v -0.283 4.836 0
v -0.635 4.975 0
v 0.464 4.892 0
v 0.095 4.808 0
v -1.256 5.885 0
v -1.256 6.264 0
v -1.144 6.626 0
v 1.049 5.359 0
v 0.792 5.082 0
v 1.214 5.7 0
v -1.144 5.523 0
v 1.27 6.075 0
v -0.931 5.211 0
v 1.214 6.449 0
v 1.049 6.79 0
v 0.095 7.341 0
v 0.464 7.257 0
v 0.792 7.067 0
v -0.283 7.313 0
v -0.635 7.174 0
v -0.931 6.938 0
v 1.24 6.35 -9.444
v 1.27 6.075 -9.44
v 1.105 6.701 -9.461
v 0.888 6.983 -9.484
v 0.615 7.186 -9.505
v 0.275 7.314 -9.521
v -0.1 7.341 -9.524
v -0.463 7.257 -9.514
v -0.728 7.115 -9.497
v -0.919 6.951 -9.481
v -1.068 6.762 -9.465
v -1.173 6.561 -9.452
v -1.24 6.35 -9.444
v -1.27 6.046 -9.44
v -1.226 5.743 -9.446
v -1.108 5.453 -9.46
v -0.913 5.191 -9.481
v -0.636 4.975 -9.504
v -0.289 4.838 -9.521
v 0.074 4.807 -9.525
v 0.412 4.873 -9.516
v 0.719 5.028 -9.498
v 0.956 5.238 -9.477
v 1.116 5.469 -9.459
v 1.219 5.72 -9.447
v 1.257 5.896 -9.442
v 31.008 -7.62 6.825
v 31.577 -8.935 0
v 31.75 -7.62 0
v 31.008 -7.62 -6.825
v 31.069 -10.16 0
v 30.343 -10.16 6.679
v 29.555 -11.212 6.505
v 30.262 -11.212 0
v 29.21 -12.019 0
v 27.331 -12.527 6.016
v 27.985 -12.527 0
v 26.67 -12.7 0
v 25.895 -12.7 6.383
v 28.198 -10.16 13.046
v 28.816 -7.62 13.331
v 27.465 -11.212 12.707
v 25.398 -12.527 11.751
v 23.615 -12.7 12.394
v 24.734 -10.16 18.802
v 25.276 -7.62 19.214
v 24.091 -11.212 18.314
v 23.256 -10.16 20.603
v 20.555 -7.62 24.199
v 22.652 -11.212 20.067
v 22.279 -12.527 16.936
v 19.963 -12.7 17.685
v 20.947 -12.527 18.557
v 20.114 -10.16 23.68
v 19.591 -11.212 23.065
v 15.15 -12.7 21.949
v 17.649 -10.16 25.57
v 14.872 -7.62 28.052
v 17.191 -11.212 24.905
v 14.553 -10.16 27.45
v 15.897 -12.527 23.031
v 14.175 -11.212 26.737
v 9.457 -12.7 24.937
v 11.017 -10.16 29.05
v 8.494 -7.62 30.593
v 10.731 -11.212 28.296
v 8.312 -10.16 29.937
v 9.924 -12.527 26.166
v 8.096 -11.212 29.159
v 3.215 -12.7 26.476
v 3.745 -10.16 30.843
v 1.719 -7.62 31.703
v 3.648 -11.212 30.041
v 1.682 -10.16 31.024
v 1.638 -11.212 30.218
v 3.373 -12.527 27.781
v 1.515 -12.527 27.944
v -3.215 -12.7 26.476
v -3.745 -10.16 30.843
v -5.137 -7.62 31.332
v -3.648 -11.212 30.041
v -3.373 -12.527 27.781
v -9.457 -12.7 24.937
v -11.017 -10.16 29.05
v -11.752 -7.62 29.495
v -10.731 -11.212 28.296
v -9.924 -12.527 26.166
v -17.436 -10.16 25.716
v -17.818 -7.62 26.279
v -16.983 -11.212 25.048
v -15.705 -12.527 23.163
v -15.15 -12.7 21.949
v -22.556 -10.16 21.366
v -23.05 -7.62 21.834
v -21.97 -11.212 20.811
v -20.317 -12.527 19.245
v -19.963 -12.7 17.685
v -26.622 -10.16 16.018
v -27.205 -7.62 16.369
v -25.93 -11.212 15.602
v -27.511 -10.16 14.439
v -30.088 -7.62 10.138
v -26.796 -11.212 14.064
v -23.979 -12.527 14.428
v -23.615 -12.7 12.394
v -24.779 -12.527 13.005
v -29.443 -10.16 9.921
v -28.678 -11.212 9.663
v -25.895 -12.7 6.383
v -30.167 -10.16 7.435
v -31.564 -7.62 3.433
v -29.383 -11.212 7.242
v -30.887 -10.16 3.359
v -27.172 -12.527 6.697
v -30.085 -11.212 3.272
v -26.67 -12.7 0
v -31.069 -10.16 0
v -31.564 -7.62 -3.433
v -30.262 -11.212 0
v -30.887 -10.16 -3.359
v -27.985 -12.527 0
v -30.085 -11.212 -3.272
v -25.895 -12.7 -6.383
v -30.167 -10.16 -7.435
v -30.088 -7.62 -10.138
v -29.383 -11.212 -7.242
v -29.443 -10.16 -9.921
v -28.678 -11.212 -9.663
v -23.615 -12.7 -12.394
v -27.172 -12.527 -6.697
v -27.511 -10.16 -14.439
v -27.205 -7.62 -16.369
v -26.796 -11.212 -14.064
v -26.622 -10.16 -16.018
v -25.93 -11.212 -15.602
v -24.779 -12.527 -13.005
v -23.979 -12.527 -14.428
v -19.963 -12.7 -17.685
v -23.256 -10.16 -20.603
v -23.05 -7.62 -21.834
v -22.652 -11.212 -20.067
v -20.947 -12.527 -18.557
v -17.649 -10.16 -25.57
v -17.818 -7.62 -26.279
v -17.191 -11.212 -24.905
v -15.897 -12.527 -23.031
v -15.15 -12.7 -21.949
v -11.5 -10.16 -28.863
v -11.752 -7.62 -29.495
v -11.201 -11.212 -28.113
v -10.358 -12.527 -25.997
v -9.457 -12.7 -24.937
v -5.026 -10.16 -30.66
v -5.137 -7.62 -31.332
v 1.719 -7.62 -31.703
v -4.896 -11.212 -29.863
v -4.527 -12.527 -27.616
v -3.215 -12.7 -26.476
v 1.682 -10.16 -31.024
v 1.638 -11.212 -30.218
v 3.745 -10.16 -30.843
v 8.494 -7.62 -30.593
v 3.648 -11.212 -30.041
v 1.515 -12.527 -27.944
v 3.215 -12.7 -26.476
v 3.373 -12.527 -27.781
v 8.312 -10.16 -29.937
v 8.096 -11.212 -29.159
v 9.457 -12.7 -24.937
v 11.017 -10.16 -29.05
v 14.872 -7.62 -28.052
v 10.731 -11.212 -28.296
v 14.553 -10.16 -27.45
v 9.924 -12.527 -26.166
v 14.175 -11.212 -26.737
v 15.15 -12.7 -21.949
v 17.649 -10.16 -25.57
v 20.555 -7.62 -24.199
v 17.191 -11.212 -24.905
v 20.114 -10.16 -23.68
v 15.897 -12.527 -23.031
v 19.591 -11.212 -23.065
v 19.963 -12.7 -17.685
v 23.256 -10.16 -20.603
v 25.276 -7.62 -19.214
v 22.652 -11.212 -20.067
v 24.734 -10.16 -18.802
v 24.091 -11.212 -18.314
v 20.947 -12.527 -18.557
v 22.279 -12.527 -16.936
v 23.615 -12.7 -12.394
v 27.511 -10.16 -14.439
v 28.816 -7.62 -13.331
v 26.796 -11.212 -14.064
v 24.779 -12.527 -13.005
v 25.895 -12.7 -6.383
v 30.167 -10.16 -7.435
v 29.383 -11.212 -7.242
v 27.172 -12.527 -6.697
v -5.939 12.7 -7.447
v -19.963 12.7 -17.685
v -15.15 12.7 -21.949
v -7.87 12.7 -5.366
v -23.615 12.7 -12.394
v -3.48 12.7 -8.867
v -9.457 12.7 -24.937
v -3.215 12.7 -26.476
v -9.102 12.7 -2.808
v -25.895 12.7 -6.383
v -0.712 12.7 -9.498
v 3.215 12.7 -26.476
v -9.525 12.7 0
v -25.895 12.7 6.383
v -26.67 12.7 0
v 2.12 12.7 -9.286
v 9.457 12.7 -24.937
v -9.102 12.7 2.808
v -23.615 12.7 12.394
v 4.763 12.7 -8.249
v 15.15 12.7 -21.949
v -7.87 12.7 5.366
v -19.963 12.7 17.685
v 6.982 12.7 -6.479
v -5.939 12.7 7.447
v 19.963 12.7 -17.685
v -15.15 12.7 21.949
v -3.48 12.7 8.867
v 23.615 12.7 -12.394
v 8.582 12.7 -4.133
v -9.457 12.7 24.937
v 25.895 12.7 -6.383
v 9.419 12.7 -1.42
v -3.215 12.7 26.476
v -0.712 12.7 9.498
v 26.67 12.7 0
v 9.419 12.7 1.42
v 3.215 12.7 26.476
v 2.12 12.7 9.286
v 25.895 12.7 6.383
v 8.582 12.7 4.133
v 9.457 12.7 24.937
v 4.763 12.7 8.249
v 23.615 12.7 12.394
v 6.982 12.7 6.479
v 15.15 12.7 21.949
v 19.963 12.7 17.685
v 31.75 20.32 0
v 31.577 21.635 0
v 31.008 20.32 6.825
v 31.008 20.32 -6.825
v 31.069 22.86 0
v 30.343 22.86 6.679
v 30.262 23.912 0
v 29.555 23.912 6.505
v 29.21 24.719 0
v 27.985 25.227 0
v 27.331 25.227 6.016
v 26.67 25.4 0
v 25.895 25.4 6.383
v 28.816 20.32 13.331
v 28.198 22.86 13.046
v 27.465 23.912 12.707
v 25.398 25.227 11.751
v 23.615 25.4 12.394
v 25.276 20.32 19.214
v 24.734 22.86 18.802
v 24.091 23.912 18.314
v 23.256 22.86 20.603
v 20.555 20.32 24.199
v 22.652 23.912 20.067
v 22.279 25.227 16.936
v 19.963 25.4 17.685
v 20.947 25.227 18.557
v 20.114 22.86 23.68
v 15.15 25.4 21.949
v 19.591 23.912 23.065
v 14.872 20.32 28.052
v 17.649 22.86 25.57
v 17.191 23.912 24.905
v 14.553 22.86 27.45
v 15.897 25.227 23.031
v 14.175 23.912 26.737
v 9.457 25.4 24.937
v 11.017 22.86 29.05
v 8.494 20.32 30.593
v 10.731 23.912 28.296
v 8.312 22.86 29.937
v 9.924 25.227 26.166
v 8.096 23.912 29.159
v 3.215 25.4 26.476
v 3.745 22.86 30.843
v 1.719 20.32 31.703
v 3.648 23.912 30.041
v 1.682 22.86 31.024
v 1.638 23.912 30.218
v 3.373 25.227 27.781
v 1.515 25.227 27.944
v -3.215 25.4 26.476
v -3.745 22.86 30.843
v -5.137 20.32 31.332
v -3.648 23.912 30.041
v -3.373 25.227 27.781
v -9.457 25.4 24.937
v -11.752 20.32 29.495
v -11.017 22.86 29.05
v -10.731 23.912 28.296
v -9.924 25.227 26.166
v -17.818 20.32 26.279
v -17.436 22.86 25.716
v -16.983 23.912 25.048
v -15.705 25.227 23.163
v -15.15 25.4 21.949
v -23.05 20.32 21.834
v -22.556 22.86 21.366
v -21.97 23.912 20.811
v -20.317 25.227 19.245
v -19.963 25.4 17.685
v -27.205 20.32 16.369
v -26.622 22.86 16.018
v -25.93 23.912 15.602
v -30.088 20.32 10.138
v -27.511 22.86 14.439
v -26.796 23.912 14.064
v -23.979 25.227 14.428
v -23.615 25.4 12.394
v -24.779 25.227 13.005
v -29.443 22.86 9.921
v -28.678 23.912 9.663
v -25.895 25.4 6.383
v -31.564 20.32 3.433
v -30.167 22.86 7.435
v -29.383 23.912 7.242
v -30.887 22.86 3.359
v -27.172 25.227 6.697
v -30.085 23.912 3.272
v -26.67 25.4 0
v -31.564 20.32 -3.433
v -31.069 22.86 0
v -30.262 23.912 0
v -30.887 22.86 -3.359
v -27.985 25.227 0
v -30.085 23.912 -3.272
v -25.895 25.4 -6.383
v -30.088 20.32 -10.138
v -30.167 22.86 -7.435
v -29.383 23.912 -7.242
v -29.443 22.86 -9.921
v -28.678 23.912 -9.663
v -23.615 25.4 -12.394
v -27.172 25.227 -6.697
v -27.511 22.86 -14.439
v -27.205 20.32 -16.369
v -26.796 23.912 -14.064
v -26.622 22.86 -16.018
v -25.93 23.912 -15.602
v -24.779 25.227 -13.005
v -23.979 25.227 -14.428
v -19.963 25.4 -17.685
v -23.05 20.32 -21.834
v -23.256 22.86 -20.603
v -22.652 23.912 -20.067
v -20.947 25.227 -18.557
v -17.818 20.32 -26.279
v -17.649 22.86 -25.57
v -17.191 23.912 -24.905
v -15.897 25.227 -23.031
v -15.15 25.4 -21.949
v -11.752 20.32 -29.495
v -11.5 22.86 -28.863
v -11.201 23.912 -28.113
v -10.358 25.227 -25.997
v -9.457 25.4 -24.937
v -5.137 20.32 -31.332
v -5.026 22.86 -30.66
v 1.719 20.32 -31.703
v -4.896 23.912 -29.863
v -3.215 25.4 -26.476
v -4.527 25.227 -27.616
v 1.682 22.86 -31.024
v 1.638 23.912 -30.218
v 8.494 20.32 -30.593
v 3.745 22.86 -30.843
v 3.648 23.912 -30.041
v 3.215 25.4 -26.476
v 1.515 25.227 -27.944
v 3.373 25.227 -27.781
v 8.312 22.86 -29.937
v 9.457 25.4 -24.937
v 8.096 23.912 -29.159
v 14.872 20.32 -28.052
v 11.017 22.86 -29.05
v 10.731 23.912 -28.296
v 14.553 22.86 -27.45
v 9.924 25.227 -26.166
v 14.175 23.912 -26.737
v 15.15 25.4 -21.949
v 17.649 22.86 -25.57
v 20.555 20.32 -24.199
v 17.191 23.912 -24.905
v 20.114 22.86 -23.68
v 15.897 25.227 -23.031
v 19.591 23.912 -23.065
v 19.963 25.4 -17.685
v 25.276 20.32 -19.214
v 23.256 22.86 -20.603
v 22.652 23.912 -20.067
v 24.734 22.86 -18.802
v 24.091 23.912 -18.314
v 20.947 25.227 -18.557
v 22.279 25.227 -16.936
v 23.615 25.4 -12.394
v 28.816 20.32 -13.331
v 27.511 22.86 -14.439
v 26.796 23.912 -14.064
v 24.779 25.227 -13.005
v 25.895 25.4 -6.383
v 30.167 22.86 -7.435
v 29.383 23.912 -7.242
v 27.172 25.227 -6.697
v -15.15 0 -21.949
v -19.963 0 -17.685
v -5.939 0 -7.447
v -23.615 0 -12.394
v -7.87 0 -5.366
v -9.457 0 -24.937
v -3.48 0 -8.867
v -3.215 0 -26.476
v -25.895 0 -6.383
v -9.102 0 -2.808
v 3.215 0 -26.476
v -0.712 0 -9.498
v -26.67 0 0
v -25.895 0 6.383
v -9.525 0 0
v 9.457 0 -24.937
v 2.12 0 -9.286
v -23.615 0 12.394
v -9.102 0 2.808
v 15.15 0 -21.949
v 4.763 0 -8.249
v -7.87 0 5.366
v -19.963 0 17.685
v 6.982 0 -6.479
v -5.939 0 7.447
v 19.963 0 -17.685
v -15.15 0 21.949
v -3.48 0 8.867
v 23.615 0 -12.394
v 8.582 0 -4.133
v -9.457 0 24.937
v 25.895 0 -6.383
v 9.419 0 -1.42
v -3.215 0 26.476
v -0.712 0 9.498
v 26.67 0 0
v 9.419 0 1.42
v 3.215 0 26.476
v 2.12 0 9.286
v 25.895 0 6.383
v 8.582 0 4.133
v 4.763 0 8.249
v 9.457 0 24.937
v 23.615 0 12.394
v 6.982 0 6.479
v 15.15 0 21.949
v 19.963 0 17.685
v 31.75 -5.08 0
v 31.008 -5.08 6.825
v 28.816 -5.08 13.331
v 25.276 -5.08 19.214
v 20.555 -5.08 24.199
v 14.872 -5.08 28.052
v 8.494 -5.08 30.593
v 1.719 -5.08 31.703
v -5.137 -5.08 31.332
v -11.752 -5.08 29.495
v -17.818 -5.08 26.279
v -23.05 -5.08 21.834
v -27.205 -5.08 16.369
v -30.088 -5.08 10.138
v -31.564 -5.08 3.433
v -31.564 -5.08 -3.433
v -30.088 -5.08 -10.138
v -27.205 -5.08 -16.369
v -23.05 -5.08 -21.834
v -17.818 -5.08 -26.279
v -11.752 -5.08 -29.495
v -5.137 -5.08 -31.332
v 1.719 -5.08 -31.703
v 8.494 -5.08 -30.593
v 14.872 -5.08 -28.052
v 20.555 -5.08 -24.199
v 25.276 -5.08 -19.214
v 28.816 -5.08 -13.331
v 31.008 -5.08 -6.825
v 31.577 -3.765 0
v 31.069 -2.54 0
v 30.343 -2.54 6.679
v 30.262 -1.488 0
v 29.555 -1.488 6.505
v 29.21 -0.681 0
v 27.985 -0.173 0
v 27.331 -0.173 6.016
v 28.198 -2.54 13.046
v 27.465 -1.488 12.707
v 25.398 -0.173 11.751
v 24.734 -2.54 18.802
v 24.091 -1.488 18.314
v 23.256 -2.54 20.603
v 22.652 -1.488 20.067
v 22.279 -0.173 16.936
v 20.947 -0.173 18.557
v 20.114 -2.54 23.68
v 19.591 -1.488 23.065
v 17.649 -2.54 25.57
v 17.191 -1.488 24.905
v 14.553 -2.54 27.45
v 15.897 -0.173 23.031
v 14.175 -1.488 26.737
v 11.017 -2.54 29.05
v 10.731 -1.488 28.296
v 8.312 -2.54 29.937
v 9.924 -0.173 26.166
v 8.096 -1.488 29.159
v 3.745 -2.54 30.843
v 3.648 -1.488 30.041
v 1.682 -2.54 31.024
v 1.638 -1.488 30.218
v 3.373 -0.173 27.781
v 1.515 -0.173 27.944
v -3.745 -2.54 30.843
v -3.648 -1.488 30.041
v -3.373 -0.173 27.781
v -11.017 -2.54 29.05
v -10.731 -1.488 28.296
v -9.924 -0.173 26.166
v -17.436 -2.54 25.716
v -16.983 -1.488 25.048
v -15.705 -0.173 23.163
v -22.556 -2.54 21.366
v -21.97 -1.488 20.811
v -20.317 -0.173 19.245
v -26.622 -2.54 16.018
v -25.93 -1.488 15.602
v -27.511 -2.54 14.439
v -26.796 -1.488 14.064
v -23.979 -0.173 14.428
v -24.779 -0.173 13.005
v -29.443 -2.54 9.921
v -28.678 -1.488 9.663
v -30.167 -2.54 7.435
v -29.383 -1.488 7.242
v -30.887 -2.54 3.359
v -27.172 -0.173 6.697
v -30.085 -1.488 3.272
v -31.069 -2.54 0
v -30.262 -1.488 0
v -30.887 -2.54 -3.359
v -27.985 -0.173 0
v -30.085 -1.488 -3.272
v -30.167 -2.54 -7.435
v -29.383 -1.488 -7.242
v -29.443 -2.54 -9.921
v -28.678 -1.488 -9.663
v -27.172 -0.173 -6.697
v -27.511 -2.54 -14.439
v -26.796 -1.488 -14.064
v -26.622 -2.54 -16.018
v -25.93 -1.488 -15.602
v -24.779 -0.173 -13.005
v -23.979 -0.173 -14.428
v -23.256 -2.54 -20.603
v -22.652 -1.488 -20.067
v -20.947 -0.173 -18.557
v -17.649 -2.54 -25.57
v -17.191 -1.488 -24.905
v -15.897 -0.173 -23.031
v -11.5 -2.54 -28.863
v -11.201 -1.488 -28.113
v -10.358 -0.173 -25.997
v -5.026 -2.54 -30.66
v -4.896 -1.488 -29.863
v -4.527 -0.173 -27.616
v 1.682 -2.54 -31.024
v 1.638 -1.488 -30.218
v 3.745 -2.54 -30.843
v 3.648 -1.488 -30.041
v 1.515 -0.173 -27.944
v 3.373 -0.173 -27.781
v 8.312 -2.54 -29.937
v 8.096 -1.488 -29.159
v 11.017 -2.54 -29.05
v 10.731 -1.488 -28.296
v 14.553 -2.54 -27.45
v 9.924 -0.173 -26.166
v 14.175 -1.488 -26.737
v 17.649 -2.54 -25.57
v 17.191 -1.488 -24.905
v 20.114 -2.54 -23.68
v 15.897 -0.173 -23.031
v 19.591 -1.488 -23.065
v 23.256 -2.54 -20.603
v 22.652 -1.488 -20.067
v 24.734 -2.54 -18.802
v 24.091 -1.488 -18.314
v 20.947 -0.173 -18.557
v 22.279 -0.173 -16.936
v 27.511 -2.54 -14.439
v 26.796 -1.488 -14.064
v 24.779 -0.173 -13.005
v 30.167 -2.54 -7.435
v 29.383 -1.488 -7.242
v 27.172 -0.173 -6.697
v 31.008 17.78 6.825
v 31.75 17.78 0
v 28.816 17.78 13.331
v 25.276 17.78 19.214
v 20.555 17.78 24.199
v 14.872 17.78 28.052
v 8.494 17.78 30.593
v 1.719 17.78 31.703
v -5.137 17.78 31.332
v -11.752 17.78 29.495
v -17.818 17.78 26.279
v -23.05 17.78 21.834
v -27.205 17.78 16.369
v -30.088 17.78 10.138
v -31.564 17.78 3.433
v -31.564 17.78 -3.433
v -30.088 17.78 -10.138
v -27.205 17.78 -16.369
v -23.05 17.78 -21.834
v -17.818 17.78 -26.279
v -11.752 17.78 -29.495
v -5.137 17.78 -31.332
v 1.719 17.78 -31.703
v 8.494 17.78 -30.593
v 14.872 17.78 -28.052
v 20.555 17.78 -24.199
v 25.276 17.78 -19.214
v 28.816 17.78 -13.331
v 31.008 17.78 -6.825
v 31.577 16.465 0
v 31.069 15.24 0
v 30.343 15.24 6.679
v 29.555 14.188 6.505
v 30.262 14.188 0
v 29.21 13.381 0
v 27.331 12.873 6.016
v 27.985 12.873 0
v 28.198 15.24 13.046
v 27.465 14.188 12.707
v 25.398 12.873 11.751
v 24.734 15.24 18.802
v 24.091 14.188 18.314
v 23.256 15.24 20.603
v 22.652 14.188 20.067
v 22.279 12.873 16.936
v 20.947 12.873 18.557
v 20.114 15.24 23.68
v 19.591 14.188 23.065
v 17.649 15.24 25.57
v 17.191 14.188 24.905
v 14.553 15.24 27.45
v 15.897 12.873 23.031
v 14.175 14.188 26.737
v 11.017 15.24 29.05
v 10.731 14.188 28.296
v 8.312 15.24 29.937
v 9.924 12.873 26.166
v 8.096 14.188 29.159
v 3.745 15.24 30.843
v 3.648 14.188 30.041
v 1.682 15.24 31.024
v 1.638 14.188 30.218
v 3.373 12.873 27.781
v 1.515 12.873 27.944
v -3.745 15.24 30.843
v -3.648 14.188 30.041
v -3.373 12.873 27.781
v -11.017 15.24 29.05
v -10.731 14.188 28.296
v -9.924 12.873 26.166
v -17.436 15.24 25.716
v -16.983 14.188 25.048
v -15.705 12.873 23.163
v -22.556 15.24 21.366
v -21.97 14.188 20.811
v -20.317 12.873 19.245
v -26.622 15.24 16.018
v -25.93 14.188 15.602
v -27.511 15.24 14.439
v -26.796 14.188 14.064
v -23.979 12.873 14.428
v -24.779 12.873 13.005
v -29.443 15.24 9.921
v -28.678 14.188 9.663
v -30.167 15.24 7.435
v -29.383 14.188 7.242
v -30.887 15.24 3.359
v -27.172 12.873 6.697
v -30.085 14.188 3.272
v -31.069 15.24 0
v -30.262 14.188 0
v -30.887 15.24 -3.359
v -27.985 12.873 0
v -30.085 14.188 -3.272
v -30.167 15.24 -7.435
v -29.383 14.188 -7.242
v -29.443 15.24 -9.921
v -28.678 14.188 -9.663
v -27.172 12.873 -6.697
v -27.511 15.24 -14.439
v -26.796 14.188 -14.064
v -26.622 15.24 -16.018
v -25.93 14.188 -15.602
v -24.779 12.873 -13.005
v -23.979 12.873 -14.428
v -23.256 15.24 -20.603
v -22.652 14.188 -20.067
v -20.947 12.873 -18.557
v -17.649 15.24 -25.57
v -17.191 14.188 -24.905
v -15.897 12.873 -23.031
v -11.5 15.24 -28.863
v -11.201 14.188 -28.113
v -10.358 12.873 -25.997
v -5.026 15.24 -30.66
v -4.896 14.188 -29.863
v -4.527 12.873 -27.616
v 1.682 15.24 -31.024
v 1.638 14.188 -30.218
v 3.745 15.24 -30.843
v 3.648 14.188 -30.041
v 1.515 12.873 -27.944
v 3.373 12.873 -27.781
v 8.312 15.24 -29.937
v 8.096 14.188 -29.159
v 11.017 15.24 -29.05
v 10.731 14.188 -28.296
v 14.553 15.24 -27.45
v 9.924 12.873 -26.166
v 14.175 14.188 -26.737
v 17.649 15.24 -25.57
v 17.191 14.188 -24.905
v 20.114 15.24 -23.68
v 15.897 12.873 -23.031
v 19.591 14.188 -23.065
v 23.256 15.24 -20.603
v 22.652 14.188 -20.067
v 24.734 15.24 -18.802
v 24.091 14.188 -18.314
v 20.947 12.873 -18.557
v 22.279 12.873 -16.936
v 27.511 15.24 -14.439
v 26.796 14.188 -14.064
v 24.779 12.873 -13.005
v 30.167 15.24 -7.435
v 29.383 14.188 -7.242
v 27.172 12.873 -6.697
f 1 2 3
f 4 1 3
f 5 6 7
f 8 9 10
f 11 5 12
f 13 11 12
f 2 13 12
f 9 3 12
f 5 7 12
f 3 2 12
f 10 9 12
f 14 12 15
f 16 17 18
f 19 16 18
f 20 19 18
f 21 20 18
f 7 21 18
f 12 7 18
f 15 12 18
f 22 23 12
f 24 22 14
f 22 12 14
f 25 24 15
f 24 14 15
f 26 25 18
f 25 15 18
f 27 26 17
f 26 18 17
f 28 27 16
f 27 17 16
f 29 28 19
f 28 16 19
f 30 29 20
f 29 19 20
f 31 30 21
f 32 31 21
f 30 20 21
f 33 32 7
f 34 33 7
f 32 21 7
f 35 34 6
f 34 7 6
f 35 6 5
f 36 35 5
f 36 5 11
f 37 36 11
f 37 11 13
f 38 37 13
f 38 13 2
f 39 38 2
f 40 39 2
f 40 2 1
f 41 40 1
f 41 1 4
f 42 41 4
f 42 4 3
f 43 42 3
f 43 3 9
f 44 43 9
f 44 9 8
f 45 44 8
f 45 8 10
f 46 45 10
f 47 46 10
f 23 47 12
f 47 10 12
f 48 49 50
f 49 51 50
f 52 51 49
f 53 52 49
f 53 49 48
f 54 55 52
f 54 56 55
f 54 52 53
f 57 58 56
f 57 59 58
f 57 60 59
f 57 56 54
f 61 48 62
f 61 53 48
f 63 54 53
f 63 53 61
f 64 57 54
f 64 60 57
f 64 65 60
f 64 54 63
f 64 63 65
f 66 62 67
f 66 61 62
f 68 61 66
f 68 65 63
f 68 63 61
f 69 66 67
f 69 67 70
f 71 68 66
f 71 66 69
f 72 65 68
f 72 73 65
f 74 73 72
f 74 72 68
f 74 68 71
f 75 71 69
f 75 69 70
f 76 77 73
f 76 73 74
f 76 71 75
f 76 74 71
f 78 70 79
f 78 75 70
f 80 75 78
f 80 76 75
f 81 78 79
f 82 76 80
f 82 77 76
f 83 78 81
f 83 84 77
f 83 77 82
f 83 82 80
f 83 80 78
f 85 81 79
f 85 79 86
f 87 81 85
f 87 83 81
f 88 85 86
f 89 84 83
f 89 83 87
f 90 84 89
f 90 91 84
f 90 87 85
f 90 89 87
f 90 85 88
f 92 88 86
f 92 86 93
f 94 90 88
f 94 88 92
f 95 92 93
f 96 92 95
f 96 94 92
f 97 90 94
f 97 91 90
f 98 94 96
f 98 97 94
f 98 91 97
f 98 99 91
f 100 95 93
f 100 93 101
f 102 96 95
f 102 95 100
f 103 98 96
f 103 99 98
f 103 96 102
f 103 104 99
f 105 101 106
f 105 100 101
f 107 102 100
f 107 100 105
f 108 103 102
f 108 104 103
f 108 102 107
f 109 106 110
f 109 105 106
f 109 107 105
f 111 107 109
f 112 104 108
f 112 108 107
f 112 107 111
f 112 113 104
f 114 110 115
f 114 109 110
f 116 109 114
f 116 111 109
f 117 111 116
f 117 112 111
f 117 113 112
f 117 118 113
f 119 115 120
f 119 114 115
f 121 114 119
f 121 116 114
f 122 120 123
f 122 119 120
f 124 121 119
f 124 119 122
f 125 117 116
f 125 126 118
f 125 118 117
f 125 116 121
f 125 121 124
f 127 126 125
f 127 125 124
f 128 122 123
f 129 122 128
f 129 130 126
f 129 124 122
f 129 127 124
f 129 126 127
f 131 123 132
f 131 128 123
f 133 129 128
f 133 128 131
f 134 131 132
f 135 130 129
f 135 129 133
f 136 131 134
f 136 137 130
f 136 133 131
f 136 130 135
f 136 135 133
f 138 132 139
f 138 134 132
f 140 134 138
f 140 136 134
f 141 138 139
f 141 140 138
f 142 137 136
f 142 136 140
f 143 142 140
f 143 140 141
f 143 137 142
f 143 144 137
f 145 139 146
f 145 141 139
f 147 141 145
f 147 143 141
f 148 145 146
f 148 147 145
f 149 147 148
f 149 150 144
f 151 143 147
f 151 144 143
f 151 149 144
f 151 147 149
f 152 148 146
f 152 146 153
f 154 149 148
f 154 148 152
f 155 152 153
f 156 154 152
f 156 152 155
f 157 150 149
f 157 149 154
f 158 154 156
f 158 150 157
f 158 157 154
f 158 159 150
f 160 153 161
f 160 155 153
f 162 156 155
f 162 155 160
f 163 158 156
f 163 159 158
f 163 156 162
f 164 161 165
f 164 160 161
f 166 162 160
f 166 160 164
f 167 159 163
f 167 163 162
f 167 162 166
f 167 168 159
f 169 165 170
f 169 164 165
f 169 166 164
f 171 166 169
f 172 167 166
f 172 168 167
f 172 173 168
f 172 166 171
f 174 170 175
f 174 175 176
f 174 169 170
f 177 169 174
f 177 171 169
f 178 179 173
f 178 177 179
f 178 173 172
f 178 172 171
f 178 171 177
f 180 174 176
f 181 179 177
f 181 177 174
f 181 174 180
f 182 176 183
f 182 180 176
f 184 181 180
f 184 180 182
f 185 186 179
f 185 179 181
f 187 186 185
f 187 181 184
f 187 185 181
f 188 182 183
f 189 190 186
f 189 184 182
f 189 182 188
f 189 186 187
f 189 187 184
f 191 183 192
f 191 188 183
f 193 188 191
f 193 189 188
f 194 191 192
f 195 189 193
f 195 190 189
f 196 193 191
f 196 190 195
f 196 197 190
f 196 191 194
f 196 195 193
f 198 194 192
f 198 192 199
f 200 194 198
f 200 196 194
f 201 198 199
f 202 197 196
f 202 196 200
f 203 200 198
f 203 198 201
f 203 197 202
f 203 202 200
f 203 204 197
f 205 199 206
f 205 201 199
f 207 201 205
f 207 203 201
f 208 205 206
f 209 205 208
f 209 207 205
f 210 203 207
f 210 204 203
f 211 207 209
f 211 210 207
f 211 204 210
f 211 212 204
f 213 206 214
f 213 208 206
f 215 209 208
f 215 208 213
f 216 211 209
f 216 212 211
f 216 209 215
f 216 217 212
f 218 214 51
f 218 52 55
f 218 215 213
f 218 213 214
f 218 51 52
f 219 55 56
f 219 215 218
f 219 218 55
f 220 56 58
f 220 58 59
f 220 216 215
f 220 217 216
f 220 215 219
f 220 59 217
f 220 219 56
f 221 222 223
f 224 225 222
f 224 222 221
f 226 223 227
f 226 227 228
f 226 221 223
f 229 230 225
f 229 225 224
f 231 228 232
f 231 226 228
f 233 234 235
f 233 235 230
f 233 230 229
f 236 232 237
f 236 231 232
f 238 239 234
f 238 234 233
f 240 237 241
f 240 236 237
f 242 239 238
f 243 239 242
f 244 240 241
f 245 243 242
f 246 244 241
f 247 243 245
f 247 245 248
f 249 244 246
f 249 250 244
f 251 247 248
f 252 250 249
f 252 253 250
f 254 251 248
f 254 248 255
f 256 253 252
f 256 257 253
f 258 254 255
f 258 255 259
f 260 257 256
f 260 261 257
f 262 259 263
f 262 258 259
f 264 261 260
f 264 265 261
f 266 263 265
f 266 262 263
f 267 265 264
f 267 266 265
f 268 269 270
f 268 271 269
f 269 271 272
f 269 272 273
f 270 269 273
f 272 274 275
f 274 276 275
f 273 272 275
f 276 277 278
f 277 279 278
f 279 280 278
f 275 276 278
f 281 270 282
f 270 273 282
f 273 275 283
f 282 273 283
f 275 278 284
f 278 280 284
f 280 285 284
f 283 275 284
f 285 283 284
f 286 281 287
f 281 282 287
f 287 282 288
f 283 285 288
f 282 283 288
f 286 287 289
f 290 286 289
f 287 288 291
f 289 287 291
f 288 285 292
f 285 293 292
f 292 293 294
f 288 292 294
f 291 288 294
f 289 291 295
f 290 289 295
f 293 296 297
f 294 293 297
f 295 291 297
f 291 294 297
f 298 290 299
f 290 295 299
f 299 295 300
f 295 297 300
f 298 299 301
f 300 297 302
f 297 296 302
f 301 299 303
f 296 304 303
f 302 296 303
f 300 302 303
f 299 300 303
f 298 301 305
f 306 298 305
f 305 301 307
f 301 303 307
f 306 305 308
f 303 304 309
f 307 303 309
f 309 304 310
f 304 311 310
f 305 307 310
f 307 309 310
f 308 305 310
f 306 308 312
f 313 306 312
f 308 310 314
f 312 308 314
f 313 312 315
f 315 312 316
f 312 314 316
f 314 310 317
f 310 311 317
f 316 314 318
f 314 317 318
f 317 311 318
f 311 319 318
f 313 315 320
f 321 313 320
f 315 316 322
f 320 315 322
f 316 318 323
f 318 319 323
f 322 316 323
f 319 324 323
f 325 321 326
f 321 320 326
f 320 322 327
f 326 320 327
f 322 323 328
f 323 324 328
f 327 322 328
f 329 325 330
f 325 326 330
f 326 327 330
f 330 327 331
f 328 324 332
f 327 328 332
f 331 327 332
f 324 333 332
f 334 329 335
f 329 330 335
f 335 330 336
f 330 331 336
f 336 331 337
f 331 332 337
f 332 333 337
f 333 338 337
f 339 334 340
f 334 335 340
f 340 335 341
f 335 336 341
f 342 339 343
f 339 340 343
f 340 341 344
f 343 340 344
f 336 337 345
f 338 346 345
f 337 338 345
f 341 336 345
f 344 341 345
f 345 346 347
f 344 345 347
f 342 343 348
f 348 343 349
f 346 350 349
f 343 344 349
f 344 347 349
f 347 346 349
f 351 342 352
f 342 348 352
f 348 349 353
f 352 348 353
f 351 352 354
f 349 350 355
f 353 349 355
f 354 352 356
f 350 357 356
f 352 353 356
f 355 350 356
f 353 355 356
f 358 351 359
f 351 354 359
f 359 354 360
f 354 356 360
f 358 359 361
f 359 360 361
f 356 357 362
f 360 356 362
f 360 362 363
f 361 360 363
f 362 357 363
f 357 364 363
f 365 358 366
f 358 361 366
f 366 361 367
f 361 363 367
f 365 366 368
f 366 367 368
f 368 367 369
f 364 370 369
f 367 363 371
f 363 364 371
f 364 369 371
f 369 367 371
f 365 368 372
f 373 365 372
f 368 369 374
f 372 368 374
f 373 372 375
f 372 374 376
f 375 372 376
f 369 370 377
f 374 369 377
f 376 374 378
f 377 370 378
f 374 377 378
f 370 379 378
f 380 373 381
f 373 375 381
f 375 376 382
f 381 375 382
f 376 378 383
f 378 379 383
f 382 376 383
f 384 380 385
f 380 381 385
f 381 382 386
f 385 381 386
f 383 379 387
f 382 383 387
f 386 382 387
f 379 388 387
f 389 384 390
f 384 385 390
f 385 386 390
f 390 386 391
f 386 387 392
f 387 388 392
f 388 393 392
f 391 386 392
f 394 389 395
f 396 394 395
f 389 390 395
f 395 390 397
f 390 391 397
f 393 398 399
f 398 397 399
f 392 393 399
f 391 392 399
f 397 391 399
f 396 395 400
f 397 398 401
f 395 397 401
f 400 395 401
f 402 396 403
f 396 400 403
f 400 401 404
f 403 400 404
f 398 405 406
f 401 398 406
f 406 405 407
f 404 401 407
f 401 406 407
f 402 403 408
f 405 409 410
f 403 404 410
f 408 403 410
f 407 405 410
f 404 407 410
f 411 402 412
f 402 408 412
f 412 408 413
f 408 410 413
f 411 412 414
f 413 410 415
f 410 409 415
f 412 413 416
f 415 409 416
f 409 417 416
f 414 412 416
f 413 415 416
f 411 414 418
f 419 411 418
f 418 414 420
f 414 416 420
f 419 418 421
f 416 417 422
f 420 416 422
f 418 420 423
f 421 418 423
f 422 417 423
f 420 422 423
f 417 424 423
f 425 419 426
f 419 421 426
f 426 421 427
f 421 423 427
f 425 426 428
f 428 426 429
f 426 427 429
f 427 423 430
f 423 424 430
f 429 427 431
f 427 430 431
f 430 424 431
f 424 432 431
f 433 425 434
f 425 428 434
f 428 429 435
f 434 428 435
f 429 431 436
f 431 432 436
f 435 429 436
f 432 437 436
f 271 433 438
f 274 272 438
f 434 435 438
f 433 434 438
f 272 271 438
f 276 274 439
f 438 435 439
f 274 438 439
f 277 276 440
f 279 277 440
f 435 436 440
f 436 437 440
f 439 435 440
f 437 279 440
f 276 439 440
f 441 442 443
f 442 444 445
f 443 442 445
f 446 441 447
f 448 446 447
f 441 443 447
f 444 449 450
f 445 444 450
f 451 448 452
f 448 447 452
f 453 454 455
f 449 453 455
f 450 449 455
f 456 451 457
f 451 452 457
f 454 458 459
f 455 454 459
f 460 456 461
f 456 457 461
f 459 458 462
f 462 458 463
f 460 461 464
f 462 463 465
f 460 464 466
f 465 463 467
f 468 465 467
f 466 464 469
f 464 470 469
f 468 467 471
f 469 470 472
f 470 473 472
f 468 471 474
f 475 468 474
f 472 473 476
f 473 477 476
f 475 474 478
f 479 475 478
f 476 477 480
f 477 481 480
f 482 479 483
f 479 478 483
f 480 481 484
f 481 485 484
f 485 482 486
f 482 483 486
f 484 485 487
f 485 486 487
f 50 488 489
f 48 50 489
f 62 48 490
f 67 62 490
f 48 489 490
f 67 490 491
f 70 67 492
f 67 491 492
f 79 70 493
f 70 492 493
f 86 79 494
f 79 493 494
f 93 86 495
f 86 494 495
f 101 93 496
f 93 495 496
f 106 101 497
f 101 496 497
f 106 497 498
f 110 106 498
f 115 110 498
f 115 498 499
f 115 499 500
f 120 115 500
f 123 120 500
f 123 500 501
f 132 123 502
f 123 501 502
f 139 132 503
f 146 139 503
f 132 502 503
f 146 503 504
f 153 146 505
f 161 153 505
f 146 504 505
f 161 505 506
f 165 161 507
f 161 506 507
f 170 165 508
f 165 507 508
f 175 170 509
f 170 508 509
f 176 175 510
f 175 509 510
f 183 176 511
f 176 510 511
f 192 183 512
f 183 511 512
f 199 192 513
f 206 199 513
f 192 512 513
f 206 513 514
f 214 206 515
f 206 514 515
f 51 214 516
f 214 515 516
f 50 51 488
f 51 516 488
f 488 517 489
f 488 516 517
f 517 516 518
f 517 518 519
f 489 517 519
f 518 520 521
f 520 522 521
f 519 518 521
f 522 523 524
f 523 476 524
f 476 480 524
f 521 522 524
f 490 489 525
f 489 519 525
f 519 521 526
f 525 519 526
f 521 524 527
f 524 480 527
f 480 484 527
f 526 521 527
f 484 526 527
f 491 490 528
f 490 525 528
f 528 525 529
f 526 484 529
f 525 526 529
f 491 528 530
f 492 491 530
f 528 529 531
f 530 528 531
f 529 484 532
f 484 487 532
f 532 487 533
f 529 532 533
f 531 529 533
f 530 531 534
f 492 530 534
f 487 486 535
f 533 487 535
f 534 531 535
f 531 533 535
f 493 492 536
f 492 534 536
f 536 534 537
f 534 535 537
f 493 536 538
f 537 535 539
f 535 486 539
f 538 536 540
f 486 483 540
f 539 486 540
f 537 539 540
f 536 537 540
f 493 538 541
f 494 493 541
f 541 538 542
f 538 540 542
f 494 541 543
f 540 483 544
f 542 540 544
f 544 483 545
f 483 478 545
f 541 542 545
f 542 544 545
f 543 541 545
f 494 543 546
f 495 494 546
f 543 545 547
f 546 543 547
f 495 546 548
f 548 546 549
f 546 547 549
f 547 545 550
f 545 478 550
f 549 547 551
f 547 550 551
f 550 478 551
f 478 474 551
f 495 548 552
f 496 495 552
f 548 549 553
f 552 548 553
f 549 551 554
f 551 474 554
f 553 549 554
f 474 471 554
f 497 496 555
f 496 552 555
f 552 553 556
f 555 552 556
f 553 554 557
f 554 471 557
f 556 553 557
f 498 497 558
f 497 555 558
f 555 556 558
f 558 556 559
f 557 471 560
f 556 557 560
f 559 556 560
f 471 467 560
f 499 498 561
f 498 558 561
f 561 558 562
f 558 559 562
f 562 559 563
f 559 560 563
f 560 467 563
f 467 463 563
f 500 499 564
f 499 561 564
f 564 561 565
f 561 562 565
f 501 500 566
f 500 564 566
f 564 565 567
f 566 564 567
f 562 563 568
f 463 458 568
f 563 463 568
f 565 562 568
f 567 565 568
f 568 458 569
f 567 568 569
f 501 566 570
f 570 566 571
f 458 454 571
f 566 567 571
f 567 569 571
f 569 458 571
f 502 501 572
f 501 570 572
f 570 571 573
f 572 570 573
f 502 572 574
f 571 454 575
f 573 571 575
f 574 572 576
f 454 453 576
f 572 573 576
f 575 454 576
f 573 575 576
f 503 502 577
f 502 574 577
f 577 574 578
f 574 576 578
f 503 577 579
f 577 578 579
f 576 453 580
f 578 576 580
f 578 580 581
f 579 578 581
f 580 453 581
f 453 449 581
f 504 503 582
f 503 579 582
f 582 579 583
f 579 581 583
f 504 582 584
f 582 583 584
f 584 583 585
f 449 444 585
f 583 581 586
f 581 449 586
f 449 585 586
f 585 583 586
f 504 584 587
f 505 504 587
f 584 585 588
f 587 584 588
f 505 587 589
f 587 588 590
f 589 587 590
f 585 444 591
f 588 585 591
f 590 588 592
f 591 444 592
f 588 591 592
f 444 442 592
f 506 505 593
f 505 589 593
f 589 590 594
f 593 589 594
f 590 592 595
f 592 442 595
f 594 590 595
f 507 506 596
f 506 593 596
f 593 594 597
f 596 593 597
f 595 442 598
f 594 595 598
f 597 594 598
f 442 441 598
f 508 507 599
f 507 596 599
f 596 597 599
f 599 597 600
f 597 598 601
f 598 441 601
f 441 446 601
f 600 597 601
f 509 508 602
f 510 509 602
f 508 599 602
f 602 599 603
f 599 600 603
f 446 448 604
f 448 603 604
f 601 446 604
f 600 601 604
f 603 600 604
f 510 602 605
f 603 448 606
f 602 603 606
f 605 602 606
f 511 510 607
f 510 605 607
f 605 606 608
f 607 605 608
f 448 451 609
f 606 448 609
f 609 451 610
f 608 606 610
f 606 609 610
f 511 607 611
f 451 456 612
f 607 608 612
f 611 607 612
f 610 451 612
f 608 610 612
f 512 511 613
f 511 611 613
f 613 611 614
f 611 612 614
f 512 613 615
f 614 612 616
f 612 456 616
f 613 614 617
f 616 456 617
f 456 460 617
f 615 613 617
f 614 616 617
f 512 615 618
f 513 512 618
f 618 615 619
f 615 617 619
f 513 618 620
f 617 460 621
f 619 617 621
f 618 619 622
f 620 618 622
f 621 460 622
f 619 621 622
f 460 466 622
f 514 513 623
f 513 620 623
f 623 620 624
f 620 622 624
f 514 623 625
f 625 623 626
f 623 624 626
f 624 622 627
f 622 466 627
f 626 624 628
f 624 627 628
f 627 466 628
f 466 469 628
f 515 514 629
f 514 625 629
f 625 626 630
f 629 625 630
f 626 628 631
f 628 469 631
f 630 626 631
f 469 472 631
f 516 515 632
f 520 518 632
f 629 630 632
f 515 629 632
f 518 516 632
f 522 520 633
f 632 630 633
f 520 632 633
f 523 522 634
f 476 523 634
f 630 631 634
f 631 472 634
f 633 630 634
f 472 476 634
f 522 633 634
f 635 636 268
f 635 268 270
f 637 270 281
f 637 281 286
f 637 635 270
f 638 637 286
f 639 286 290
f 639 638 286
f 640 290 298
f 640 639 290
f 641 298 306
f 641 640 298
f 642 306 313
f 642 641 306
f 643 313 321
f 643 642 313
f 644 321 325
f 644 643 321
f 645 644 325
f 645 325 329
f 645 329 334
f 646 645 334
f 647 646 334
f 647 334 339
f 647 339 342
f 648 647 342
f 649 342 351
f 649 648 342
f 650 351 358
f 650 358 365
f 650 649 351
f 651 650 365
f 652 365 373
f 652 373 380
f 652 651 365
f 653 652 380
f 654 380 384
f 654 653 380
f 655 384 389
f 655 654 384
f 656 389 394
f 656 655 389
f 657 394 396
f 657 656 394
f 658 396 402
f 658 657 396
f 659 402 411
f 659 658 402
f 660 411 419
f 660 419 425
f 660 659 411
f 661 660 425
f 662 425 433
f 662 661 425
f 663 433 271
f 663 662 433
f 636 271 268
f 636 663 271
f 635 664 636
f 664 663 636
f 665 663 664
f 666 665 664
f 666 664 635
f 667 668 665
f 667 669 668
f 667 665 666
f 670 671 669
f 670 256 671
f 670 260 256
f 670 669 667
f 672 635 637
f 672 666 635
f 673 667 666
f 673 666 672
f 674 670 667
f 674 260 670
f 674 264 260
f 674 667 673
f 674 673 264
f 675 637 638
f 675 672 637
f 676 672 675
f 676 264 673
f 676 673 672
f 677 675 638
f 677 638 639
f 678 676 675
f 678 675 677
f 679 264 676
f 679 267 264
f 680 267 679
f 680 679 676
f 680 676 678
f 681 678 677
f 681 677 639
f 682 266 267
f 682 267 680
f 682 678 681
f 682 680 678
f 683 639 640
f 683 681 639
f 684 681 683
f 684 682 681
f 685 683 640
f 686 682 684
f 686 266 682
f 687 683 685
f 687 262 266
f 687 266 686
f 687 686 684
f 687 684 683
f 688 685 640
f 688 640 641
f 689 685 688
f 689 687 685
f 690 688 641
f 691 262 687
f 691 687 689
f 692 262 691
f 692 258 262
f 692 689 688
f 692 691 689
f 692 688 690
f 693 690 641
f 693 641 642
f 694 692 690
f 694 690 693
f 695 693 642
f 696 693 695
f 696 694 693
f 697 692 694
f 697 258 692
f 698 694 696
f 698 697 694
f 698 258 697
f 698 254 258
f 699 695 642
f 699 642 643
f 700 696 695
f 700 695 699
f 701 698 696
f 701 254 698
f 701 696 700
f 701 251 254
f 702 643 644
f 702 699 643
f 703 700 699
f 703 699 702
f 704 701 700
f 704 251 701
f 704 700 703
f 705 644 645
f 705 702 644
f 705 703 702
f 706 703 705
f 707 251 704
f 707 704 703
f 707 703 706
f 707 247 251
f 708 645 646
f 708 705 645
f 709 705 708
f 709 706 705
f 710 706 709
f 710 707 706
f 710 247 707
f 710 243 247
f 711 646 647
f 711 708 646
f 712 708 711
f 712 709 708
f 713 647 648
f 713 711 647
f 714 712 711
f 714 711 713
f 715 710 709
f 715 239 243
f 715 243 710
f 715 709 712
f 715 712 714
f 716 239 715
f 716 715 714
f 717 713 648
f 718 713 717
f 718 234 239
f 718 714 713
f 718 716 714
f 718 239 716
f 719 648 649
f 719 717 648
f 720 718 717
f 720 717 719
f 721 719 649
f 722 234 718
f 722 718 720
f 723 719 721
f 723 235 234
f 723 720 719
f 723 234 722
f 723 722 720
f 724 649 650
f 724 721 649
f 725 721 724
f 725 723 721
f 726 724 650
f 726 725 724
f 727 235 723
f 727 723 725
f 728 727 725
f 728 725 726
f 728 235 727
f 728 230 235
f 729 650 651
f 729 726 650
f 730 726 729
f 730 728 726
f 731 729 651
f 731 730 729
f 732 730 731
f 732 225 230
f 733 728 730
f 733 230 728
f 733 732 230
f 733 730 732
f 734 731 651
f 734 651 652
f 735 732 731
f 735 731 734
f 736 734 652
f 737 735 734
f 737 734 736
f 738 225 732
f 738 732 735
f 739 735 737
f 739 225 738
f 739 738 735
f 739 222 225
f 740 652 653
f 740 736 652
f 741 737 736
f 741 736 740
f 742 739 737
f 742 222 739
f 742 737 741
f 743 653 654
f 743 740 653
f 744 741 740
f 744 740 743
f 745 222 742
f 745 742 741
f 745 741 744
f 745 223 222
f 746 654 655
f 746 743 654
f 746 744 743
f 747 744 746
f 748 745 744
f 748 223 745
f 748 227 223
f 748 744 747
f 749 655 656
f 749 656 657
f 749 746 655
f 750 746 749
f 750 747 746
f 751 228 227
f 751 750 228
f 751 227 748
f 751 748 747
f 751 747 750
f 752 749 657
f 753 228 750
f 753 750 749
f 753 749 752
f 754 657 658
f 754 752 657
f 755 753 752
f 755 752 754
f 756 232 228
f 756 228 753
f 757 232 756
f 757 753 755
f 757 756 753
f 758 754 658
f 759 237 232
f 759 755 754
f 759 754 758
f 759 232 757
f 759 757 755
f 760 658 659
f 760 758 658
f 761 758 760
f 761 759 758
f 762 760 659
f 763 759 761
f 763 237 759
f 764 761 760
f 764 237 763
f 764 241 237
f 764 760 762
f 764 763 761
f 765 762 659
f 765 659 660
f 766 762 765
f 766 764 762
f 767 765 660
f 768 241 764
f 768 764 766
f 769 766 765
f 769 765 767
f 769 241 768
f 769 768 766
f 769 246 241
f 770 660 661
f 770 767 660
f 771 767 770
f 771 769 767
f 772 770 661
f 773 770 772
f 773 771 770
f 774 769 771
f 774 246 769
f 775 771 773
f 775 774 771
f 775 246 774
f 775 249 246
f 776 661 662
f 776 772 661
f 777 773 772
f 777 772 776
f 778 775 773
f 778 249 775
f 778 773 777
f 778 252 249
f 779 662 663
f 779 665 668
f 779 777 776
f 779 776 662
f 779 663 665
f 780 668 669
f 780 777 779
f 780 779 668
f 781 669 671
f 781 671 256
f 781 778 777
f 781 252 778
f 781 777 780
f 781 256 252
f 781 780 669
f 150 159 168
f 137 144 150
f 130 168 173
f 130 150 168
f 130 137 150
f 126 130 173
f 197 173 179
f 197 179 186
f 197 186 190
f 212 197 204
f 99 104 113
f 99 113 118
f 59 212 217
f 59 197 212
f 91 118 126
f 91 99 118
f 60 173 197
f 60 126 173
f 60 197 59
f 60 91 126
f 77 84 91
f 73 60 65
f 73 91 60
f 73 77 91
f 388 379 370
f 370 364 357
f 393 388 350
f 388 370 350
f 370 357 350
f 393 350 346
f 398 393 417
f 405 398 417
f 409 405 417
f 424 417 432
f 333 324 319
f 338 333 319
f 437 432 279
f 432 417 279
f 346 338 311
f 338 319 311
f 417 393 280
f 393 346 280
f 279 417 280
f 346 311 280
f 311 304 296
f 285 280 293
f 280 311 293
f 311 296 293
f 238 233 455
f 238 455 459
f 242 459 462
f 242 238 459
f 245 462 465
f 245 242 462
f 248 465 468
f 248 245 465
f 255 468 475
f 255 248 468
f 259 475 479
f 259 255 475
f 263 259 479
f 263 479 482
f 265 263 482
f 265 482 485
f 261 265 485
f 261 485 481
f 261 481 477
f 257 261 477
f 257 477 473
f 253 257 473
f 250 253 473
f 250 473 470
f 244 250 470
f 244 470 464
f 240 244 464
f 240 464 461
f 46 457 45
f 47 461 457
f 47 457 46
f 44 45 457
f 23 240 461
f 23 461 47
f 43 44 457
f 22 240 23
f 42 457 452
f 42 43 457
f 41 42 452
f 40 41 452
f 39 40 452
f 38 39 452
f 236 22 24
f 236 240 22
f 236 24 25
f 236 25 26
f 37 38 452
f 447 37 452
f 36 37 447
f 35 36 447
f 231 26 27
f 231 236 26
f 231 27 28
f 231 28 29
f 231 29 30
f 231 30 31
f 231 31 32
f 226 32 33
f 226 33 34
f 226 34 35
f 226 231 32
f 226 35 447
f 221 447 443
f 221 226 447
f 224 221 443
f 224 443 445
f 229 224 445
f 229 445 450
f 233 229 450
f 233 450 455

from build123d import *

# Parameters (mm, degrees)
F0_R     = 31.75
F1_DEPTH = 12.7
F2_R     = 5.08
F3_R     = 9.525
F4_DEPTH = 6.35
F7_D     = 2.54
F7_DEPTH = 25.4
F7_TIP   = 0.7630929862


with BuildPart() as f1:
    # F0 (on Front) → F1 (new body)
    with BuildSketch(Plane.XZ):
        Circle(F0_R)
    extrude(amount=F1_DEPTH)

    # F2
    f2_edges = [f1.edges().sort_by_distance(p)[0] for p in [
        (-31.75, -12.7, 0),
        (-31.75, 0, 0),
    ]]
    fillet(f2_edges, radius=F2_R)

    # F3 (on face) → F4 (join)
    with BuildSketch(Plane(origin=(0, 0, 0), x_dir=(-1, 0, 0), z_dir=(0, 1, 0))):
        Circle(F3_R)
    extrude(amount=F4_DEPTH)

    # F5: F1 across face


with BuildPart() as f1_1:
    add(f1.part)
    add(f1.part.mirror(Plane(origin=(0, 6.35, 0), x_dir=(-1, 0, 0), z_dir=(0, 1, 0))))

    # F7 (one way)
    with BuildSketch(Plane.XY):
        with Locations((0, 6.0745161027)):
            Circle(F7_D / 2)
    extrude(amount=-F7_DEPTH, mode=Mode.SUBTRACT)
    with Locations(Plane.XY):
        with Locations((0, 6.0745161027)):
            with Locations((0, 0, -(F7_DEPTH + F7_TIP / 2))):  # 118° drill point
                Cone(0, F7_D / 2, F7_TIP, mode=Mode.SUBTRACT)


solid = f1_1.part
